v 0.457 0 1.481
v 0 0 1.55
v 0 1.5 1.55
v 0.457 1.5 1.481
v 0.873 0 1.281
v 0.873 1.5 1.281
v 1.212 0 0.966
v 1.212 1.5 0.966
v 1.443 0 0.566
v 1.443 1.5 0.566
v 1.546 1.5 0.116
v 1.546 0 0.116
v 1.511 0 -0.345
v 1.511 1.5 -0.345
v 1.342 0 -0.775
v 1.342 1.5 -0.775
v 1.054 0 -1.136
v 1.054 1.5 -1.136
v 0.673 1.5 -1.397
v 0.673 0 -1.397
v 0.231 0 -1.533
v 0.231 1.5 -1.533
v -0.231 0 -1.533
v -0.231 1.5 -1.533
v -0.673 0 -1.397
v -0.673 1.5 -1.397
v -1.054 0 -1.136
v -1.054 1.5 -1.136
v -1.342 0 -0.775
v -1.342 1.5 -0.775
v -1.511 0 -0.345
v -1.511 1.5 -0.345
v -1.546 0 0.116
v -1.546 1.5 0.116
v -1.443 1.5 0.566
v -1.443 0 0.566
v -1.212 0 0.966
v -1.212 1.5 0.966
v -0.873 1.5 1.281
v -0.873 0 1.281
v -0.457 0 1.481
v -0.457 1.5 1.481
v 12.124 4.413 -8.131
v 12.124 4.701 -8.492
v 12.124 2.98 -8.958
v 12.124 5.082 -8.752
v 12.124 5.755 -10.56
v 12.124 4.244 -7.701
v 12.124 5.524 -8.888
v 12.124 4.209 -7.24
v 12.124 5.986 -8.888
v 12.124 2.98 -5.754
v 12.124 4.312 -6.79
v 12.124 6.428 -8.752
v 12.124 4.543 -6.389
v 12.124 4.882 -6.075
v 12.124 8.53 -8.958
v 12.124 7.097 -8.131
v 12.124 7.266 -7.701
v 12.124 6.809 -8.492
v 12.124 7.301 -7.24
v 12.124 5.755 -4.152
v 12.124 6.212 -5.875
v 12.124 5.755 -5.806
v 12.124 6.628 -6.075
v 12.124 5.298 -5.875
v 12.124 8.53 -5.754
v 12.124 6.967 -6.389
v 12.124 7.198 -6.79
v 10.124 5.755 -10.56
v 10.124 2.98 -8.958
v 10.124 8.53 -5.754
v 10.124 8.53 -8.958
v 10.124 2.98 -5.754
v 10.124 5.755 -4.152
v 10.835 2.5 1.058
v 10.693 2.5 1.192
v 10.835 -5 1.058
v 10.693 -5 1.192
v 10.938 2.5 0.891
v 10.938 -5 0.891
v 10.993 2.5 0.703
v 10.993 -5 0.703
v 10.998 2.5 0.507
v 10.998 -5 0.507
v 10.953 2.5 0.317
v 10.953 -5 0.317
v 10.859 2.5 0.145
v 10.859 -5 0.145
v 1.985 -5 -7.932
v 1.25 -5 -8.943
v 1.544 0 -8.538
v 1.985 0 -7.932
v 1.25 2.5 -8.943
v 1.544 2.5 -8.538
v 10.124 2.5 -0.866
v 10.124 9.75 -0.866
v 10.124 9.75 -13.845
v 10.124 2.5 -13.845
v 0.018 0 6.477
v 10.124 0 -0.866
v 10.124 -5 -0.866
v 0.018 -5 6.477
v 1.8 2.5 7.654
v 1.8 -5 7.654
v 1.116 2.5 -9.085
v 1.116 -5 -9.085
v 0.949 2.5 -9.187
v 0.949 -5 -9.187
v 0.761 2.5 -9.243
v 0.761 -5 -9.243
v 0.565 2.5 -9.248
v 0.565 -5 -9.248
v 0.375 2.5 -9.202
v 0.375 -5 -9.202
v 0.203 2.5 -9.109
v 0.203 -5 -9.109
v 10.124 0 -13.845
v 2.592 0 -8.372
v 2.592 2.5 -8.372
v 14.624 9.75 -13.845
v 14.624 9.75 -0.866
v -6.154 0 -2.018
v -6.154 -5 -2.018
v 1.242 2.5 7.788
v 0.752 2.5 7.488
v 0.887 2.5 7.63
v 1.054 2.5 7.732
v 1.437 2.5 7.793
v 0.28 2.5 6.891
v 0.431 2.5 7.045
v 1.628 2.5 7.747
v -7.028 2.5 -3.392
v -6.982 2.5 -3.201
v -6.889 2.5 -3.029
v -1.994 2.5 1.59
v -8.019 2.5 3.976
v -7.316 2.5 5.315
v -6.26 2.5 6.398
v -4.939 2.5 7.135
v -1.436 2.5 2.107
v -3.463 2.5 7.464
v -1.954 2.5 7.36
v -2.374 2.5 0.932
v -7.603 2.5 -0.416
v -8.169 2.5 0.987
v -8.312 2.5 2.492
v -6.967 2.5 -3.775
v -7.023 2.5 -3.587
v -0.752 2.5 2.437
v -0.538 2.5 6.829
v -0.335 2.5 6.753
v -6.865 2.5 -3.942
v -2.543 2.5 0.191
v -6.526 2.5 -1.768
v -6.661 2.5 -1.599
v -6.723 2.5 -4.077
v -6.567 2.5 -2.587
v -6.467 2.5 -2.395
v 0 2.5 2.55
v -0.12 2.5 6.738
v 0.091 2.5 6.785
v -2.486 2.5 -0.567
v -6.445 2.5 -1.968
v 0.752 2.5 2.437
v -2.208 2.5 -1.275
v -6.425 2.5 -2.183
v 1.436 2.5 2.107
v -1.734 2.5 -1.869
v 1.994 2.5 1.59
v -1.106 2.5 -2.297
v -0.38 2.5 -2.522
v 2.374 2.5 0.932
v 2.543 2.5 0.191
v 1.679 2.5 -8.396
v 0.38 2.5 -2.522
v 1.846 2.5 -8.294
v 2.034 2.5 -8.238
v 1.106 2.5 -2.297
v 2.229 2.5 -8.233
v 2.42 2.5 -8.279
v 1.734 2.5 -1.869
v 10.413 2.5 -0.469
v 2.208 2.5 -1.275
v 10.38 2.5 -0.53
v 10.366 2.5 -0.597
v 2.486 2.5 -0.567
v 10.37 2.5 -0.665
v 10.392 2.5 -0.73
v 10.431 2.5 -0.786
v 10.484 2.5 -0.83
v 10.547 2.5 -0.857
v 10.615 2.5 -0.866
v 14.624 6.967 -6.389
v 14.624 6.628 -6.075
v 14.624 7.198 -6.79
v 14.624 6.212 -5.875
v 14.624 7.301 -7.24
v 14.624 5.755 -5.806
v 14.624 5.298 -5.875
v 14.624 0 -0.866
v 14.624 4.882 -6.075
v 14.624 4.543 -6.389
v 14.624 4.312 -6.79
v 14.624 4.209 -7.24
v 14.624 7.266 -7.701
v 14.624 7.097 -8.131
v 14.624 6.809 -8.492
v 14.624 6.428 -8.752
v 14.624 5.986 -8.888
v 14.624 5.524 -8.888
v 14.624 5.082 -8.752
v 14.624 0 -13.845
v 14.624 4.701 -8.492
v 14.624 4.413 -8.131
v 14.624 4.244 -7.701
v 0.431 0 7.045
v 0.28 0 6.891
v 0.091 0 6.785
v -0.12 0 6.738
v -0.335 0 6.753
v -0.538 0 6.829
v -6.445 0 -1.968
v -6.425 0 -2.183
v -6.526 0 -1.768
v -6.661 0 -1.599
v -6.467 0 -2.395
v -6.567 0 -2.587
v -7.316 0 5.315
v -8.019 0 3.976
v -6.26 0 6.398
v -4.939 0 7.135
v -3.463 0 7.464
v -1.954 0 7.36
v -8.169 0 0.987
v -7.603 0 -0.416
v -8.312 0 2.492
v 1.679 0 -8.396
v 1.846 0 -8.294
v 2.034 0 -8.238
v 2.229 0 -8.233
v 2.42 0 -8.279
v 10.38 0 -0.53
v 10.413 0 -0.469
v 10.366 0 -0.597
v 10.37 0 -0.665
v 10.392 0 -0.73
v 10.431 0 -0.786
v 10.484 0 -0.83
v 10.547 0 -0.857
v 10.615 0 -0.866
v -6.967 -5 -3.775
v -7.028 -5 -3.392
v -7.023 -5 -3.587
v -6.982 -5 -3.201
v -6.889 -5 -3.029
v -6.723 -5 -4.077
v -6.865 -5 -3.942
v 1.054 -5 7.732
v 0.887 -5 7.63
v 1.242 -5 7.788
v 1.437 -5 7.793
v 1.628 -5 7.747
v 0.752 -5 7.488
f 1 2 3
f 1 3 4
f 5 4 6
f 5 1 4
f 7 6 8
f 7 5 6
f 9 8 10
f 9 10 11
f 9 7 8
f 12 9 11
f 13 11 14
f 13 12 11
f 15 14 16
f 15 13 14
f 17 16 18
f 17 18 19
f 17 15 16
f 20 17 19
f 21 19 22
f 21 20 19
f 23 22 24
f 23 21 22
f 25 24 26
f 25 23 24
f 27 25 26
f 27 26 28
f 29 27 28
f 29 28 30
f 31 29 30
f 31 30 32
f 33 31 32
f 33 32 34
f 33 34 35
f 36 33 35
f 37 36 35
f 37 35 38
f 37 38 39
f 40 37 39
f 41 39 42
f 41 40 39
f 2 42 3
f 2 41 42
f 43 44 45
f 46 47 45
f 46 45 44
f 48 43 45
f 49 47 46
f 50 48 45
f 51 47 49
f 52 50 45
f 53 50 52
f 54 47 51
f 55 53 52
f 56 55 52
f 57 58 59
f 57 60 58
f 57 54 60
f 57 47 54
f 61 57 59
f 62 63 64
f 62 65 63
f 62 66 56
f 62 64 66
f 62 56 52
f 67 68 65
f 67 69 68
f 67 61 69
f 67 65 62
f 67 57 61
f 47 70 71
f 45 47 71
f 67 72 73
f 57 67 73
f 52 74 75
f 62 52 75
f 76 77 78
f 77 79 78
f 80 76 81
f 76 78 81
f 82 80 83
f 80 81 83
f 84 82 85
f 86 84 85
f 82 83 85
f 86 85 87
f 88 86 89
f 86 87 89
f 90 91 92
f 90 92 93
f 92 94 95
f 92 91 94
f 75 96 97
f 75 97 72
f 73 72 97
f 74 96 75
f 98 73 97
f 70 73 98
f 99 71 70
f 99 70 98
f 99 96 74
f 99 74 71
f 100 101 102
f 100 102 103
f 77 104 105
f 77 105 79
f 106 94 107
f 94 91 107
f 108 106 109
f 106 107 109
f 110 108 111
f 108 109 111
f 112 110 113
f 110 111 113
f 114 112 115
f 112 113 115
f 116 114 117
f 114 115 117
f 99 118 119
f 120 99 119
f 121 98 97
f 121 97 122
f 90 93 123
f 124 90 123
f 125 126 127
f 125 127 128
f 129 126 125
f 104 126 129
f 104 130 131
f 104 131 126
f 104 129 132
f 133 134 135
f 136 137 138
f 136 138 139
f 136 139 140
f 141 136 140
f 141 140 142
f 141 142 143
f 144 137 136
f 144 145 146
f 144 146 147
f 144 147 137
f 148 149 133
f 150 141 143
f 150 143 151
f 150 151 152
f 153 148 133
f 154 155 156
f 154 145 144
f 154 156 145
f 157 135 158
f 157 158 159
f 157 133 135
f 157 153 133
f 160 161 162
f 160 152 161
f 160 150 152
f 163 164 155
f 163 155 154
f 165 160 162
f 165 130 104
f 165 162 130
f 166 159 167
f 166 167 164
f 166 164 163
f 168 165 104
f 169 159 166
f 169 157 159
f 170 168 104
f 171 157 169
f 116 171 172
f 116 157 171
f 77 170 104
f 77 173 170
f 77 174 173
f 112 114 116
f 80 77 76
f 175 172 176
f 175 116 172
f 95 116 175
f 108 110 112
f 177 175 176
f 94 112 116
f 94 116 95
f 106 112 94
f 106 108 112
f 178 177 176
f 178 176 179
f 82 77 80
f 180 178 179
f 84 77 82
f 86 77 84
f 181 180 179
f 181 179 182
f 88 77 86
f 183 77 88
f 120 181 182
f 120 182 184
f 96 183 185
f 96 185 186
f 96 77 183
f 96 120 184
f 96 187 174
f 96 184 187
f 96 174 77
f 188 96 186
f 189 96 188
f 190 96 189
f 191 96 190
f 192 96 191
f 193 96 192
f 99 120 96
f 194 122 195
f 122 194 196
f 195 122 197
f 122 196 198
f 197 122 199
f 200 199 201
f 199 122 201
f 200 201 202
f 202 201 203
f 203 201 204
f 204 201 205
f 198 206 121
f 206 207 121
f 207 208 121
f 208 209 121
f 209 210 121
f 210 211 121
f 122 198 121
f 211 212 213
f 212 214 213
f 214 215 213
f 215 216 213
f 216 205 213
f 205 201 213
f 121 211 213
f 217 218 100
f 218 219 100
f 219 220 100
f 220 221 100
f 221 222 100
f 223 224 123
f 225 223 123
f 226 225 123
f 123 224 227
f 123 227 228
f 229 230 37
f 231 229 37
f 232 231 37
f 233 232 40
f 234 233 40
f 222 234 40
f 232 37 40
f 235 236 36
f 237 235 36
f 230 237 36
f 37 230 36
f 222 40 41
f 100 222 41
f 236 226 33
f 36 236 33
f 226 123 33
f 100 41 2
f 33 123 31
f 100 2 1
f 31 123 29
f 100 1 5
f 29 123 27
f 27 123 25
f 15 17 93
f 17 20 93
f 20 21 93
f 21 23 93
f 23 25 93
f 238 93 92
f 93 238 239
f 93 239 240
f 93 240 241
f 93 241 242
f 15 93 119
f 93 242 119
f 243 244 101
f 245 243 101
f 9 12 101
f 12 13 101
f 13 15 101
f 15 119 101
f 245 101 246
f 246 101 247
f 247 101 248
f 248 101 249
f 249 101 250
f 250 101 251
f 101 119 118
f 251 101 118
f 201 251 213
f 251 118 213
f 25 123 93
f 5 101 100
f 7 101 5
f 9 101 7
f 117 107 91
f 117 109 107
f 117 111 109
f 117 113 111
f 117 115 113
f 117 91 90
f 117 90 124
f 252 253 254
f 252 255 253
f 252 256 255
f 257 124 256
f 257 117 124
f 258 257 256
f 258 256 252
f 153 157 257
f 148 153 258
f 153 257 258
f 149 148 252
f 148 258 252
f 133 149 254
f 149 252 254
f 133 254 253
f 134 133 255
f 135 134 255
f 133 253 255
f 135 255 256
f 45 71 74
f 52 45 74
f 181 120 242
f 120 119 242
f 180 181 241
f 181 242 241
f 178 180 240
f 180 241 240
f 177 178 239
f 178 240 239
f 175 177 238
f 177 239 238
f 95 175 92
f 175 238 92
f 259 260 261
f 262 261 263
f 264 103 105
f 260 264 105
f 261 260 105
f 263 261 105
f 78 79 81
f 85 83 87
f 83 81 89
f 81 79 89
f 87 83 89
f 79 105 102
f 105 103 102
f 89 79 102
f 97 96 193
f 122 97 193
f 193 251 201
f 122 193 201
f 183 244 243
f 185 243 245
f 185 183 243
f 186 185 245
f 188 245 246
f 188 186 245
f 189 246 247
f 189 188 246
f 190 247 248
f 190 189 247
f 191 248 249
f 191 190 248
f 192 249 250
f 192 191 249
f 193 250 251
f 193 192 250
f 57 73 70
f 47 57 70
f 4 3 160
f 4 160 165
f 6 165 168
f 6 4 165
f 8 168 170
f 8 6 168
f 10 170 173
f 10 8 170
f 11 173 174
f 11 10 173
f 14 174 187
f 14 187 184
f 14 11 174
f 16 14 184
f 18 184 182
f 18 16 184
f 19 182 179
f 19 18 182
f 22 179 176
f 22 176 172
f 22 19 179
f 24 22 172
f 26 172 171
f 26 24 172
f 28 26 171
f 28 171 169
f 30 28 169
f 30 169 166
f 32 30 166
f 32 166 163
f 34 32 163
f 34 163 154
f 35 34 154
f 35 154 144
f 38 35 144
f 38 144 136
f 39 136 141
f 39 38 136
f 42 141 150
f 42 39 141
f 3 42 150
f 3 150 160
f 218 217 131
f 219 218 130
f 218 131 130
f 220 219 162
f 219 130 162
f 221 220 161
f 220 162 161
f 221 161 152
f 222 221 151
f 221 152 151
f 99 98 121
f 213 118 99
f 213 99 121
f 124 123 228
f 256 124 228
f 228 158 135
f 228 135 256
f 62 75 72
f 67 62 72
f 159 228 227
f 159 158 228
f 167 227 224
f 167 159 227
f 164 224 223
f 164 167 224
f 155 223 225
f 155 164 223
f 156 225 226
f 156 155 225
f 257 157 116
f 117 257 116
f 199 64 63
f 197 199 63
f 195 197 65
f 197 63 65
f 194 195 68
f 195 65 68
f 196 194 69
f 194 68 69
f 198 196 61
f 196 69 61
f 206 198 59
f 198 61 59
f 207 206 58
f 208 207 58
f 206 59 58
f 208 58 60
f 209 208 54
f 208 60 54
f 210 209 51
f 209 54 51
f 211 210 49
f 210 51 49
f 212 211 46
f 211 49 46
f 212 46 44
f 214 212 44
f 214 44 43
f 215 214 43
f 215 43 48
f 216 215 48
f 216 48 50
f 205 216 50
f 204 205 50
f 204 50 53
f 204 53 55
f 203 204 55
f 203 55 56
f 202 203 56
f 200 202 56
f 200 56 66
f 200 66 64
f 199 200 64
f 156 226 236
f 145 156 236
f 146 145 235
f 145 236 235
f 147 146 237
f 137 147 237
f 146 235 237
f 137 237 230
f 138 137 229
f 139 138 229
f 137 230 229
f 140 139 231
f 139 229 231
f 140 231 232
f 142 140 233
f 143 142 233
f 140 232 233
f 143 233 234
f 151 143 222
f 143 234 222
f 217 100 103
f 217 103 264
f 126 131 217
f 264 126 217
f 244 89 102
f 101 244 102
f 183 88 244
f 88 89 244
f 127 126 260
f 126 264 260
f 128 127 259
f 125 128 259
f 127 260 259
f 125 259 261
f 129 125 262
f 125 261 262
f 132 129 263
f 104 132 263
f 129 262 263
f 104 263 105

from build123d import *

# Parameters (mm, degrees)
SKETCH_1_R             = 1.55
EXTRUDE_397_DEPTH      = 2.5
EXTRUDE_START          = 2.5
EXTRUDE_640_DEPTH      = 7.5
SKETCH_3_W             = 4.5
SKETCH_3_H             = 12.978713764
EXTRUDE_1_DEPTH        = 9.75
CHAMFER_1_SIZE         = 1
CUT_EXTRUDE_1239_DEPTH = 2
CUT_EXTRUDE_M3_REACH   = 27.038
SKETCH_6_R             = 1.55
FILLET_5_R             = 0.75
FILLET_6_R             = 0.25


with BuildPart() as part:
    # 草图1 → Extrude 397 (new body)
    with BuildSketch(Plane(origin=(0, 0, 0), x_dir=(1, 0, 0), z_dir=(0, 1, 0))):
        with BuildLine():
            Line((10.1243866, 13.845154317), (-6.15423406, 2.01804411))
            ThreePointArc((-6.15423406, 2.01804411), (-7.315700706, -5.315167685), (0.017511089, -6.476634331))
            Line((0.017511089, -6.476634331), (10.1243866, 0.866440553))
            Line((10.1243866, 0.866440553), (10.1243866, 13.845154317))
        make_face()
        with Locations(Location((0, 0, 0), (0, 0, 270))):
            Circle(SKETCH_1_R, mode=Mode.SUBTRACT)
    extrude(amount=EXTRUDE_397_DEPTH)

    # 草图2 → Extrude 640 (add)
    with BuildSketch(Plane(origin=(0, 0, 0), x_dir=(1, 0, 0), z_dir=(0, 1, 0)).offset(EXTRUDE_START)):
        Polygon((0.017511089, -6.476634331), (1.193081594, -8.09466832), (11.299957105, -0.751593436), (10.1243866, 0.866440553), align=None)
        Polygon((-7.329804565, 3.636078099), (0.809505765, 9.549633202), (1.98507627, 7.931599213), (-6.15423406, 2.01804411), align=None)
    extrude(amount=-EXTRUDE_640_DEPTH)

    # 草图3 → 限位-1 (add)
    with BuildSketch(Plane(origin=(0, 0, 0), x_dir=(1, 0, 0), z_dir=(0, 1, 0))):
        with Locations((12.3743866, 7.355797435)):
            Rectangle(SKETCH_3_W, SKETCH_3_H)
    extrude(amount=EXTRUDE_1_DEPTH)

    # 倒角1
    chamfer_1_edges = [part.edges().sort_by_distance(p)[0] for p in [
        (0, 2.5, -1.55),
    ]]
    chamfer(chamfer_1_edges, length=CHAMFER_1_SIZE)

    # 草图5 → Cut-Extrude 1239 (cut)
    with BuildSketch(Plane.ZY.offset(-10.1243866)):
        Polygon((-4.151503441, 5.755), (-5.753650438, 8.53), (-8.957944432, 8.53), (-10.560091429, 5.755), (-8.957944432, 2.98), (-5.753650438, 2.98), align=None)
    extrude(amount=-CUT_EXTRUDE_1239_DEPTH, mode=Mode.SUBTRACT)

    # 草图6 → M3螺孔 (cut, up to next)
    with BuildSketch(Plane.ZY.offset(-10.1243866), mode=Mode.PRIVATE) as cut_extrude_m3_sk1:
        with Locations((-7.355797435, 5.755)):
            Circle(SKETCH_6_R)
    cut_extrude_m3_tool1 = extrude(cut_extrude_m3_sk1.sketch, amount=-CUT_EXTRUDE_M3_REACH, mode=Mode.PRIVATE) & part.part
    add(cut_extrude_m3_tool1.solids().sort_by_distance((10.124387, 5.755, -7.355797))[0], mode=Mode.SUBTRACT)

    # 圆角5
    fillet_5_edges = [part.edges().sort_by_distance(p)[0] for p in [
        (11.299957105, -1.25, 0.751593436),
        (1.193081594, -1.25, 8.09466832),
        (1.98507627, 1.25, -7.931599213),
        (-7.329804565, -1.25, -3.636078099),
        (0.809505765, -1.25, -9.549633202),
        (-6.15423406, 1.25, -2.01804411),
        (0.017511089, 1.25, 6.476634331),
    ]]
    fillet(fillet_5_edges, radius=FILLET_5_R)

    # 圆角6
    fillet_6_edges = [part.edges().sort_by_distance(p)[0] for p in [
        (10.1243866, 1.25, -0.866440553),
    ]]
    fillet(fillet_6_edges, radius=FILLET_6_R)


solid = part.part
